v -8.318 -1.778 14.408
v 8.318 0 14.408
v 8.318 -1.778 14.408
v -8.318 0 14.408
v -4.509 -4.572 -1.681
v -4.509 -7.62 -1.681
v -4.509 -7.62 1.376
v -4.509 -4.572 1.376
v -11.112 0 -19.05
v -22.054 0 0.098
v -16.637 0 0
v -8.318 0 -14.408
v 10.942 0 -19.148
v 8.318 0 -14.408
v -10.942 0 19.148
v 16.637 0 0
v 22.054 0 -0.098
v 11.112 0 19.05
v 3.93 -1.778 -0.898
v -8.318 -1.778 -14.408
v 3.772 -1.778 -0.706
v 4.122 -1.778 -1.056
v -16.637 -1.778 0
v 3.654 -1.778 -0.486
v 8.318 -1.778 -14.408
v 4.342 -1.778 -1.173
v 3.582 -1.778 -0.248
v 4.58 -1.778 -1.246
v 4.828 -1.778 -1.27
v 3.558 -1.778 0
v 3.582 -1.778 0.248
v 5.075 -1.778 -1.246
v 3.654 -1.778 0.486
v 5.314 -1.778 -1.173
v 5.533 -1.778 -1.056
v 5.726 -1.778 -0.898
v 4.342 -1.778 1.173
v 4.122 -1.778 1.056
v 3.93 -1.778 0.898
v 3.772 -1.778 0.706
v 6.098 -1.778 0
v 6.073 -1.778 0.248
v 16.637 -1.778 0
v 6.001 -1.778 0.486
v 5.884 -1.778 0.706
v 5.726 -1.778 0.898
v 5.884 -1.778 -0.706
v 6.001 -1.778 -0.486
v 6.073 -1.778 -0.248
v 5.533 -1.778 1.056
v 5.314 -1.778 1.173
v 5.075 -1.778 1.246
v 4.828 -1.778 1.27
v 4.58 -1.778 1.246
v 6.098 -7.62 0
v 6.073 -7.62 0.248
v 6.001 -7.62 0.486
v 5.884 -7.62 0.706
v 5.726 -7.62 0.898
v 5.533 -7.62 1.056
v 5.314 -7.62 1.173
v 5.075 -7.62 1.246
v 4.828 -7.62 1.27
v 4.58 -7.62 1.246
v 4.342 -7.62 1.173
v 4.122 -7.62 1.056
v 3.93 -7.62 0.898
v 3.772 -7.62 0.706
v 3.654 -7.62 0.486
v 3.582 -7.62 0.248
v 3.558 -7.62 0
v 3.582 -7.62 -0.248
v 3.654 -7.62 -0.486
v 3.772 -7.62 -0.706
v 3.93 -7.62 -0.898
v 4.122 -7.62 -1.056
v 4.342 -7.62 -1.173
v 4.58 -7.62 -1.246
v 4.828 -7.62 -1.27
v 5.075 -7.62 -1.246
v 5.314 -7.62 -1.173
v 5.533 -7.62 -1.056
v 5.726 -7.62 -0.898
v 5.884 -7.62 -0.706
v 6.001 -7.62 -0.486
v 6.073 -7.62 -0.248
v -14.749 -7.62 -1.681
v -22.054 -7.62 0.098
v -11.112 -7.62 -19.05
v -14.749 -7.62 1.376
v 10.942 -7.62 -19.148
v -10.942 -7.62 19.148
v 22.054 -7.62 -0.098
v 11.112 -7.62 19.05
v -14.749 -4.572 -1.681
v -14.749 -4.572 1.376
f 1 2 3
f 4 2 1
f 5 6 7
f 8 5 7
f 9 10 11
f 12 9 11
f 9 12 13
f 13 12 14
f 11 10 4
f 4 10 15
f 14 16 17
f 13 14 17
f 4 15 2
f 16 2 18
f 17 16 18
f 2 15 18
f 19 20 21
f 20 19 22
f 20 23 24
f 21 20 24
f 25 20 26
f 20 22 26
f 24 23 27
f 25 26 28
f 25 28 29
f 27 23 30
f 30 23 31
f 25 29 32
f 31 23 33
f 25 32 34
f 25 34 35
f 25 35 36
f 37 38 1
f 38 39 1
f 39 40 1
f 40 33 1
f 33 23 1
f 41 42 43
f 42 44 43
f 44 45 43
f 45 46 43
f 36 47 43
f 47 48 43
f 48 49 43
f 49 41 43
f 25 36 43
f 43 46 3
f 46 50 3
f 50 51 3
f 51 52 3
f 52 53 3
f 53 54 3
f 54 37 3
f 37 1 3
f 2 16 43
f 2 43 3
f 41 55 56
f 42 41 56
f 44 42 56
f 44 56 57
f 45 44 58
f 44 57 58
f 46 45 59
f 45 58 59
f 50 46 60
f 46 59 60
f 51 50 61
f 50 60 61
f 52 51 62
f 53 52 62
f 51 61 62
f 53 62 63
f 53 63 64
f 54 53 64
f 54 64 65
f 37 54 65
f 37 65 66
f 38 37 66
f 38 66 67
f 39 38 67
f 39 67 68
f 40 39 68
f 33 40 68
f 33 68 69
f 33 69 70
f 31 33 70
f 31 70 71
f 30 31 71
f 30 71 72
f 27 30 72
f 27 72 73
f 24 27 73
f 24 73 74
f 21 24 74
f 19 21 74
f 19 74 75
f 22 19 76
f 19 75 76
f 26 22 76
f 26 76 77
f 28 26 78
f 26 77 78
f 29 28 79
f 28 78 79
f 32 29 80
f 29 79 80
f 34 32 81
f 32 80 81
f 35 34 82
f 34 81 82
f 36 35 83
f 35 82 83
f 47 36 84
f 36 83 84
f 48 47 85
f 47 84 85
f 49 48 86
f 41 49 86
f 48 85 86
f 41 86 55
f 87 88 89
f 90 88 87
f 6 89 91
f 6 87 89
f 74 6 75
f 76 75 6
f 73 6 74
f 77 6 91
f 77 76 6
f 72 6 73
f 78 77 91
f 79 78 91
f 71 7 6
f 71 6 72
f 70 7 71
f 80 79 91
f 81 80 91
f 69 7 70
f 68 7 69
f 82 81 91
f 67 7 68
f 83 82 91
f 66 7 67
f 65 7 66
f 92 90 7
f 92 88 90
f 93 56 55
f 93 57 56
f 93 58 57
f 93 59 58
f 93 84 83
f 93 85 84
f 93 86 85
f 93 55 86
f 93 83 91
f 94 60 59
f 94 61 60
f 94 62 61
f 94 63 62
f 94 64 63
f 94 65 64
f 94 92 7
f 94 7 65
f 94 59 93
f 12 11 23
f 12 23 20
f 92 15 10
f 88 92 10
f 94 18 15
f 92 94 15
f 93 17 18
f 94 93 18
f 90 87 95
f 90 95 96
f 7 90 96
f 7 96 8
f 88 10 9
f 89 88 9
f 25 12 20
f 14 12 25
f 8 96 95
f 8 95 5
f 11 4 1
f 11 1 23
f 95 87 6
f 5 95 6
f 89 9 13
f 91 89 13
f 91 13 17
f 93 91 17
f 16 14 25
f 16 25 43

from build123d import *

# Parameters (mm, degrees)
F1_DEPTH = 7.62
F2_R     = 1.27
F3_DEPTH = 25.4
F4_W     = 10.240057
F4_H     = 3.056733
F5_DEPTH = 3.048
F7_DEPTH = 1.778


with BuildPart() as f1:
    # F0 (on Front) → F1 (new body)
    with BuildSketch(Plane.XZ):
        Polygon((-22.053678, 0.098198), (-11.111881, -19.049946), (10.941797, -19.148145), (22.053678, -0.098198), (11.111881, 19.049946), (-10.941797, 19.148145), align=None)
    extrude(amount=F1_DEPTH)

    # F2 (on face) → F3 (cut)
    with BuildSketch(Plane.XZ.offset(7.62)):
        with Locations((4.827668, 0)):
            Circle(F2_R)
    extrude(amount=-F3_DEPTH, mode=Mode.SUBTRACT)

    # F4 (on face) → F5 (cut)
    with BuildSketch(Plane.XZ.offset(7.62)):
        with Locations((-9.62871, -0.152837)):
            Rectangle(F4_W, F4_H)
    extrude(amount=-F5_DEPTH, mode=Mode.SUBTRACT)

    # F6 (on Front) → F7 (cut)
    with BuildSketch(Plane.XZ):
        Polygon((-8.3185, -14.408065), (8.3185, -14.408065), (16.637, 0), (8.3185, 14.408065), (-8.3185, 14.408065), (-16.637, 0), align=None)
    extrude(amount=F7_DEPTH, mode=Mode.SUBTRACT)


solid = f1.part
